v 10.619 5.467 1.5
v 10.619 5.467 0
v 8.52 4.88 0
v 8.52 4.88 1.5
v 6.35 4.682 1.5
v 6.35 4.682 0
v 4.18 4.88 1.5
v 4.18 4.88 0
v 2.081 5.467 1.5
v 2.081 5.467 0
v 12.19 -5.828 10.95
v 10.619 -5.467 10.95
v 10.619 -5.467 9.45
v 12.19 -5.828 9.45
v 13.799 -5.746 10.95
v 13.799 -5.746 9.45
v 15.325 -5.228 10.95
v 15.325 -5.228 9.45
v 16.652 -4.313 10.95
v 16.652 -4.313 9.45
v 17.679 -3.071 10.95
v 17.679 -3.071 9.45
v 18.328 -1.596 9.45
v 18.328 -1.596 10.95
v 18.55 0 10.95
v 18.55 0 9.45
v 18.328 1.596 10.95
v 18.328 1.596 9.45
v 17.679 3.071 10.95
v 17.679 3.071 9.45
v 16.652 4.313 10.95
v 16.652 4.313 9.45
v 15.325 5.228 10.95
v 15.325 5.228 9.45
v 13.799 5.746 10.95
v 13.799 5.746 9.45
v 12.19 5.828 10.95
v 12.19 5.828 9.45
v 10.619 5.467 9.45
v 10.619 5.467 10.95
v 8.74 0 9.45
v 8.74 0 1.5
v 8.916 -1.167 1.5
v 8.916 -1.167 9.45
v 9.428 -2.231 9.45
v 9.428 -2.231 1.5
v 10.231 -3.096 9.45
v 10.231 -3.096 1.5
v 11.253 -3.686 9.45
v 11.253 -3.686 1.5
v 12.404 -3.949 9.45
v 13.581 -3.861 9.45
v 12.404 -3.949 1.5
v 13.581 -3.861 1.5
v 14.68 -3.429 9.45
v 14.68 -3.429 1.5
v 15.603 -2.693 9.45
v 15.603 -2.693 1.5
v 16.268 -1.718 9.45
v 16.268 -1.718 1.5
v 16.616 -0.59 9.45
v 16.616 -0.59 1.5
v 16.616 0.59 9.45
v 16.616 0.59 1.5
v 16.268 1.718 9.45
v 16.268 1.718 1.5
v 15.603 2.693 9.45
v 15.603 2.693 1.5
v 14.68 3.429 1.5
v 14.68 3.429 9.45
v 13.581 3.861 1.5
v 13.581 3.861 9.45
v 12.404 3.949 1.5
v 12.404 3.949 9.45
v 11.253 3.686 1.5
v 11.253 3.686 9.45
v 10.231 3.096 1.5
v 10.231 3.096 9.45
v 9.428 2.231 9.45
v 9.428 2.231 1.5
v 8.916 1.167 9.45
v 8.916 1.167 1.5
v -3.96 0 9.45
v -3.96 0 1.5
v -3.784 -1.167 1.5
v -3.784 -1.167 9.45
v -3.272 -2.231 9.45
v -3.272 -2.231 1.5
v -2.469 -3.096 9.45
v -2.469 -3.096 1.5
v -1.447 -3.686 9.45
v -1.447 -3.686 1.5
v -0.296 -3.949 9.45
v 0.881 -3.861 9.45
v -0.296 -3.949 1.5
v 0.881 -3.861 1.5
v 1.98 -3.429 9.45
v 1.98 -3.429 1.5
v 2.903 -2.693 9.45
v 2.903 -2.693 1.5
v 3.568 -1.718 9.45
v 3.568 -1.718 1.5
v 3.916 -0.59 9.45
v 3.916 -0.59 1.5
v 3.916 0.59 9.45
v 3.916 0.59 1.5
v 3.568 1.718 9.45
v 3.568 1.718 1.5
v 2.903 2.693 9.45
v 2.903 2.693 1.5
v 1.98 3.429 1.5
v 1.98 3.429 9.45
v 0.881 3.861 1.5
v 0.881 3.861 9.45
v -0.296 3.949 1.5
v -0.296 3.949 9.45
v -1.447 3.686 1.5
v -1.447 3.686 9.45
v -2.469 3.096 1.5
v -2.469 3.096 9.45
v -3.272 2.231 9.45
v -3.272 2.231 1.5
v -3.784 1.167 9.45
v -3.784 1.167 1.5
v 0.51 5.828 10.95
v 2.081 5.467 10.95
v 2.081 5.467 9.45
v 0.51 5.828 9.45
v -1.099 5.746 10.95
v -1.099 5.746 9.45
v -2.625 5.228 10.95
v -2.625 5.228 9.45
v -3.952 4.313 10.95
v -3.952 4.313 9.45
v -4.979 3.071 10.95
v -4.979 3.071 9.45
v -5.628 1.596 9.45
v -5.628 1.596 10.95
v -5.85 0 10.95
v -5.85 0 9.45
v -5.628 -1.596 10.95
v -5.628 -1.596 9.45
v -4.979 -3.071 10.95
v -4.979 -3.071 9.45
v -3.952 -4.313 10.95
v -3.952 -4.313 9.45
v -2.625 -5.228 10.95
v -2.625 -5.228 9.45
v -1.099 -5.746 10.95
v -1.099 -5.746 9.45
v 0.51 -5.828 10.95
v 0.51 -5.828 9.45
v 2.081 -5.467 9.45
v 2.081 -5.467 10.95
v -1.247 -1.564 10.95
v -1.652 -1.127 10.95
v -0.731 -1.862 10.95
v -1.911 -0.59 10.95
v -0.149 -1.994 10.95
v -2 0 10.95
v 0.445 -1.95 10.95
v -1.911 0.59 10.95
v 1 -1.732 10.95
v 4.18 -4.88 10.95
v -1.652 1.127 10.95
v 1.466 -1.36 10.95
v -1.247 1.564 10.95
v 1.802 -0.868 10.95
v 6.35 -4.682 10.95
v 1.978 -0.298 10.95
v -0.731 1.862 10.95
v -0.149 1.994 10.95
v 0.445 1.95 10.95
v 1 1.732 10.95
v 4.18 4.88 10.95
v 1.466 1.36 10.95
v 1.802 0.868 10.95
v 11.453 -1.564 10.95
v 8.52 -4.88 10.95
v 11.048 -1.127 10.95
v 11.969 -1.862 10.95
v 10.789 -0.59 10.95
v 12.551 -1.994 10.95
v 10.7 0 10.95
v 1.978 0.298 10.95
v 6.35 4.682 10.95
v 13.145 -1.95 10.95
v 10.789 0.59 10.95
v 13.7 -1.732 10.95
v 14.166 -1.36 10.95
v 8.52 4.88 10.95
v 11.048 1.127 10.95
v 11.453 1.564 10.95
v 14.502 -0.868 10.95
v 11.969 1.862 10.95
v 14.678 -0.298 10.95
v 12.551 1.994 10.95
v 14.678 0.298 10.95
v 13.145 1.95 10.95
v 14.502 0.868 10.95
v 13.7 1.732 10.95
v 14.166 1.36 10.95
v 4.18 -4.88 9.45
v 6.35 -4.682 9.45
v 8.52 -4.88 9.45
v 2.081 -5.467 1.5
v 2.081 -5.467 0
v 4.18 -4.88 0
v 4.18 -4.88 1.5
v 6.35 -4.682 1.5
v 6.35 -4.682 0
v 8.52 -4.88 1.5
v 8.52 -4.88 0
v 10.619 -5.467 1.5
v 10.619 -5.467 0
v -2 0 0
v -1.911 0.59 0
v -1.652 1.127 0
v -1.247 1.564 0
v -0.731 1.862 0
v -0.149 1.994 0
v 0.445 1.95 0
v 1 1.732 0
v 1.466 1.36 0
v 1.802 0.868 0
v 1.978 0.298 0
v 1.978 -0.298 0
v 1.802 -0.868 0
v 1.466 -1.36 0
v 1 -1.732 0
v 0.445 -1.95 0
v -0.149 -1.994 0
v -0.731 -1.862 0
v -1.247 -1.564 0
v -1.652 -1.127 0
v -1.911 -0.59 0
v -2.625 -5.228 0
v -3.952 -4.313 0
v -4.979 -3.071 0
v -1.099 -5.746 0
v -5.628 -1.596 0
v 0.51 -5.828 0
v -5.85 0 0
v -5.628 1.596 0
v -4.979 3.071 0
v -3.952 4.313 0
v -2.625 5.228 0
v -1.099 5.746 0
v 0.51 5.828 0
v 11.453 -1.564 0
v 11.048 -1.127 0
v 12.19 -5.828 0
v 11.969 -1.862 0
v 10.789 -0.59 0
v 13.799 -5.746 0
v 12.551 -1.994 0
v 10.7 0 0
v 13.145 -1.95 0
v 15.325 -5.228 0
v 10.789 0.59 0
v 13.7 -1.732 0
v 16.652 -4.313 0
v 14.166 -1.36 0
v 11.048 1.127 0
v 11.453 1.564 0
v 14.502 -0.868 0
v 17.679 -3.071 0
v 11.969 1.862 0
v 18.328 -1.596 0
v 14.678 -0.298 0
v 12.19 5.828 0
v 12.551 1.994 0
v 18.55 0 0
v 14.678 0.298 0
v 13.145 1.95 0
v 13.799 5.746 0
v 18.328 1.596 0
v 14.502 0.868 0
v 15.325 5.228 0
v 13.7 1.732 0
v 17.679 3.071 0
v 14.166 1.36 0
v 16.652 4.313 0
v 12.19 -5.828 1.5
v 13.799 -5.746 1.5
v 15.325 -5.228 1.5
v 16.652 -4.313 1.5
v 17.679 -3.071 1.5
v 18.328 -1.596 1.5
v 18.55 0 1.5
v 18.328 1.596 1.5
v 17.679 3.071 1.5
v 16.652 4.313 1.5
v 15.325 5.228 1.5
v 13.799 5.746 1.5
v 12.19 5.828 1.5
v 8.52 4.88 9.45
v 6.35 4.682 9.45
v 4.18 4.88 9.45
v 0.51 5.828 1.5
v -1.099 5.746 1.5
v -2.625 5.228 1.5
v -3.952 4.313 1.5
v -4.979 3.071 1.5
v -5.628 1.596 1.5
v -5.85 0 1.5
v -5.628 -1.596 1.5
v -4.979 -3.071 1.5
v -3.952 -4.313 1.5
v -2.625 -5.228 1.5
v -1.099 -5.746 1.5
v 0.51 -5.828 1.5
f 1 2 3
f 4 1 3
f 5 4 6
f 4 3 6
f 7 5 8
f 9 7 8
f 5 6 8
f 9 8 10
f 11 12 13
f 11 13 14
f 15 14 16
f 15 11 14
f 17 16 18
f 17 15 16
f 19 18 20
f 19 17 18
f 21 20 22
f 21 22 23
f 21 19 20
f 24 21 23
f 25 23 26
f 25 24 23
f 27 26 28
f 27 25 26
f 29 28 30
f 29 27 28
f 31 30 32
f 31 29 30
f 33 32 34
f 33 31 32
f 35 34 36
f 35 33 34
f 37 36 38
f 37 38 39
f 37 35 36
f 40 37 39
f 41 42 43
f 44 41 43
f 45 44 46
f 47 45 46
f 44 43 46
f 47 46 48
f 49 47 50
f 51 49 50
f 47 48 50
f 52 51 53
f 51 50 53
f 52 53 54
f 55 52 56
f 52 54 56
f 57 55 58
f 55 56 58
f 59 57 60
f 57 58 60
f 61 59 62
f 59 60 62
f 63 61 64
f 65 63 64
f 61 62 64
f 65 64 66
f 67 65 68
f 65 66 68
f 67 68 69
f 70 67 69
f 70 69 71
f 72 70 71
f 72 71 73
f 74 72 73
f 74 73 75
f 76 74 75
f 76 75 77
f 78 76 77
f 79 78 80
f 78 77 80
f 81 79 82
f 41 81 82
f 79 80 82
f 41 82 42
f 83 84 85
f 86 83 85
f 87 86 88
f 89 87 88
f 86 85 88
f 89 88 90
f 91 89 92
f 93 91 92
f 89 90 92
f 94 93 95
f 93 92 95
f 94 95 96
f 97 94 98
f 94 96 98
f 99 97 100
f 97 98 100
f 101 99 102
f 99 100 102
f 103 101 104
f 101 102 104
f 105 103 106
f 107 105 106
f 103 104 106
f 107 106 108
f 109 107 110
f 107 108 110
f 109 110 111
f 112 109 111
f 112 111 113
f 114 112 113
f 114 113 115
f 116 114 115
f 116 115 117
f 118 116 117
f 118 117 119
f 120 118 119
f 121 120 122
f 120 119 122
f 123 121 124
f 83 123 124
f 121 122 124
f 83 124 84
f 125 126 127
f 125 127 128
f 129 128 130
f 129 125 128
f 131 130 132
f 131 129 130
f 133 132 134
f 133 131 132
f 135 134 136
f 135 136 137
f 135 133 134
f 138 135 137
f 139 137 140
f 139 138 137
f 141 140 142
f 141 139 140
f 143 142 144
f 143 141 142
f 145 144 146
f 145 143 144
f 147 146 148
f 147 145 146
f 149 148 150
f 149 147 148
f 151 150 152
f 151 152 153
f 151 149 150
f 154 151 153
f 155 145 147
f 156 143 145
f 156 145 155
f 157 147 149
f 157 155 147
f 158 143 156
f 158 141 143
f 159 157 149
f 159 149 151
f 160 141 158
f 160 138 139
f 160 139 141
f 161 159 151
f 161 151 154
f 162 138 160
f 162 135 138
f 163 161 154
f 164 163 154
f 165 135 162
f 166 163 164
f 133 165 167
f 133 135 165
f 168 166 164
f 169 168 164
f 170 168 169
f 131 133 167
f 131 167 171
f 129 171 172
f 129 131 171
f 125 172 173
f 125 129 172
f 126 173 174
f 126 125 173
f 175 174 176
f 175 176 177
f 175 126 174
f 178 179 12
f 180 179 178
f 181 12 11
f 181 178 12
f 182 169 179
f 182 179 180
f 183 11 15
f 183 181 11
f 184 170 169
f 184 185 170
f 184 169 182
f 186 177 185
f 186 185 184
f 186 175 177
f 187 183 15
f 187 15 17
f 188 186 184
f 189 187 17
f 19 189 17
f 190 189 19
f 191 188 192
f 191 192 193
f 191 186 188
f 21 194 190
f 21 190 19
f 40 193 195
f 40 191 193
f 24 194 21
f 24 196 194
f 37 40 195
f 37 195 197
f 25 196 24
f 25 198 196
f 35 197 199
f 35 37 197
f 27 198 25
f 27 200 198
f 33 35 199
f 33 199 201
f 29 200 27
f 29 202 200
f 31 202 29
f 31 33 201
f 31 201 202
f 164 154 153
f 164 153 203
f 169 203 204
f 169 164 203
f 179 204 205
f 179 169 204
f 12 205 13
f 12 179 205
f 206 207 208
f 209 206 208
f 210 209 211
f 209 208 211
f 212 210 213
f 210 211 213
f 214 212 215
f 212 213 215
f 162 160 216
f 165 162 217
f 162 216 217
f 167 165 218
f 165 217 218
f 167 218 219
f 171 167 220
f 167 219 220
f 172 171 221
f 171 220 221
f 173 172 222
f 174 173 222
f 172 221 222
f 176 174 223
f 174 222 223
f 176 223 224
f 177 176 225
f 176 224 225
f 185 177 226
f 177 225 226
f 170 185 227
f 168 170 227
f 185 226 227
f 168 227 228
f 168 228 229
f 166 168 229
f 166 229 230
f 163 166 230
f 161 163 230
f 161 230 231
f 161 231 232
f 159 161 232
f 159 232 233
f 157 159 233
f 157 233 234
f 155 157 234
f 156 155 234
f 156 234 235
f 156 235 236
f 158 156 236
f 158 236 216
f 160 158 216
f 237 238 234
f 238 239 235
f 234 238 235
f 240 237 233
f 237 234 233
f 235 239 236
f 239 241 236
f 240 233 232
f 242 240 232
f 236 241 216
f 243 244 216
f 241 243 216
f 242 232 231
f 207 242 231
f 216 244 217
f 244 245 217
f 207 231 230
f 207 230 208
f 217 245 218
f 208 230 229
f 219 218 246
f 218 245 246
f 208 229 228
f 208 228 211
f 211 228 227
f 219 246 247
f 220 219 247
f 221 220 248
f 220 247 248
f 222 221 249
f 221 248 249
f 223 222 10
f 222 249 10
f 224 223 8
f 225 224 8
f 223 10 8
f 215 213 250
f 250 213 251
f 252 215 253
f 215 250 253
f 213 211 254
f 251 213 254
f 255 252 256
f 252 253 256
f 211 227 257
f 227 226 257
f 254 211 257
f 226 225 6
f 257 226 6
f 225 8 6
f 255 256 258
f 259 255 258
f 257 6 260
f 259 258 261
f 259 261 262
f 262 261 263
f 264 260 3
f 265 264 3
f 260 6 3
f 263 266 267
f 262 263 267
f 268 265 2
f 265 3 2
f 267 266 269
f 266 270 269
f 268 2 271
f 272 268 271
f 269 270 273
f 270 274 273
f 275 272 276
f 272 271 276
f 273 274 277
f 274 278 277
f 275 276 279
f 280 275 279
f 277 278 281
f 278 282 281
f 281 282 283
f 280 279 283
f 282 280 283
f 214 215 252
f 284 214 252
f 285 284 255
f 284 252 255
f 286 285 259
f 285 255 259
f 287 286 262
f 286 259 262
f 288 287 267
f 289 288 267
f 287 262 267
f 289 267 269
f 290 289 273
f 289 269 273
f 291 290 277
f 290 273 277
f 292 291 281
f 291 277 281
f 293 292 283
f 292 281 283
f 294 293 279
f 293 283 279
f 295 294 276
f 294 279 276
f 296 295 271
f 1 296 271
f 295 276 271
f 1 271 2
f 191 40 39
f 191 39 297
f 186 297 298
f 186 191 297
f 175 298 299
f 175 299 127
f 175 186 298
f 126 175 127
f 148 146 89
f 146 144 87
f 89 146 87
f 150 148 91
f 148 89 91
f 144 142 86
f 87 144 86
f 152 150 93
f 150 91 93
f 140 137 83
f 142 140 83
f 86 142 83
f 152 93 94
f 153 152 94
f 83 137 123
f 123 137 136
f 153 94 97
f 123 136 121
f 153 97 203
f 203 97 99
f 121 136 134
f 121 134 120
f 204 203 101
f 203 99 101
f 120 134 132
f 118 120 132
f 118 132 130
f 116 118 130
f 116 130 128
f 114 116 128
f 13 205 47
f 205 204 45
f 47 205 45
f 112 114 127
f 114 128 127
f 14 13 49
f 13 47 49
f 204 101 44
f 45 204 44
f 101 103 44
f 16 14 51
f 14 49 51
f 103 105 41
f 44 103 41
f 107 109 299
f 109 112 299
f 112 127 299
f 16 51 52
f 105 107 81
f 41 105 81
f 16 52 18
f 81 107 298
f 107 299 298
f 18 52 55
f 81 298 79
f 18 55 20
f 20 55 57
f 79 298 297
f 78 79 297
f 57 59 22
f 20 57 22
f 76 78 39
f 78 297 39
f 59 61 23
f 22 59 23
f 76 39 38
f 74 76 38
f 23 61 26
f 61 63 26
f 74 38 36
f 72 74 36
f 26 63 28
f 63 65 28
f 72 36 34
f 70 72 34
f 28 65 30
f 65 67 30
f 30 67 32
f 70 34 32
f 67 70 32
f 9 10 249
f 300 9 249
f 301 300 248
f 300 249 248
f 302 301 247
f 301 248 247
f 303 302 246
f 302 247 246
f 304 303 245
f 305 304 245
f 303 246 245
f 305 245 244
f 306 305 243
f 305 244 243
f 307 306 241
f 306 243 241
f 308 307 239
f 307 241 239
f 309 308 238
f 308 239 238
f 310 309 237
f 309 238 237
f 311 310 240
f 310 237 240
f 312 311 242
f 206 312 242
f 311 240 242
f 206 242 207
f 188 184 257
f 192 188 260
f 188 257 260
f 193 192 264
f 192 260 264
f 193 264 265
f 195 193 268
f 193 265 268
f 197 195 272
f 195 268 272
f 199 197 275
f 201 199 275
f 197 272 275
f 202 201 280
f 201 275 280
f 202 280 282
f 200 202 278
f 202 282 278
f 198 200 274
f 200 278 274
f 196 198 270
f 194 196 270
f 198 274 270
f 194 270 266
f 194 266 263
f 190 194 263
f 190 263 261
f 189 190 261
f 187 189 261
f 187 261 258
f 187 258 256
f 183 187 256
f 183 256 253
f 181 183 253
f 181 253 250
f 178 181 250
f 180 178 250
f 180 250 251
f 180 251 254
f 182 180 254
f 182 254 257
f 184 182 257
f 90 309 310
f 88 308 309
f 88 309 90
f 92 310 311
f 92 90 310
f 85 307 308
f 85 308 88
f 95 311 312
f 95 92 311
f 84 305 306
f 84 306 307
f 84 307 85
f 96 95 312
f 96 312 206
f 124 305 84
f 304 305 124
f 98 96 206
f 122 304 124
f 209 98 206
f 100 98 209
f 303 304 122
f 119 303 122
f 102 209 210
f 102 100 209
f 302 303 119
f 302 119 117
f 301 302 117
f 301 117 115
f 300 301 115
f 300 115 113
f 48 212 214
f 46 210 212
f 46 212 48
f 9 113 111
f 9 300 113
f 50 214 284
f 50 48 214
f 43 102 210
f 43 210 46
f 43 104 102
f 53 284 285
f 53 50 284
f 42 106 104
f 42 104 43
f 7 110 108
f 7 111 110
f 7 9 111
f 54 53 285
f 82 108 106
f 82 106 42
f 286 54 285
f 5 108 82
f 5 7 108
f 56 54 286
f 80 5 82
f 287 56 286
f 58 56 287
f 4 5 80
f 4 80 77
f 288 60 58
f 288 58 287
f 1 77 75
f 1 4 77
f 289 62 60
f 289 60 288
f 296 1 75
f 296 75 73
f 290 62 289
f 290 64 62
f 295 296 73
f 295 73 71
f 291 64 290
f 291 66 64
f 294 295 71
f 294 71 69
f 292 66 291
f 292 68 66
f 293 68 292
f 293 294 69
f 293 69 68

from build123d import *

# Parameters (mm, degrees)
BOSS_EXTRUDE1_DEPTH = 1.5
SKETCH2_R           = 3.96
BOSS_EXTRUDE2_DEPTH = 7.95
SKETCH3_R           = 2
CUT_EXTRUDE1_DEPTH  = 23.321010282


with BuildPart() as part:
    # Sketch1 → Boss-Extrude1 (new body)
    with BuildSketch(Plane.XY):
        with BuildLine():
            ThreePointArc((2.081092437, 5.467316917), (-5.85, 0), (2.081092437, -5.467316917))
            ThreePointArc((2.081092437, -5.467316917), (6.35, -4.682325977), (10.618907563, -5.467316917))
            ThreePointArc((10.618907563, -5.467316917), (18.55, 0), (10.618907563, 5.467316917))
            ThreePointArc((10.618907563, 5.467316917), (6.35, 4.682325977), (2.081092437, 5.467316917))
        make_face()
    extrude(amount=BOSS_EXTRUDE1_DEPTH)


with BuildPart() as body_2:
    # Mirror2: mirrored copy
    add(part.part.mirror(Plane.XY.offset(5.475)))


with BuildPart() as part_1:
    add(part.part)

    add(body_2.part)  # Boss-Extrude2 merges body 2
    # Sketch2 → Boss-Extrude2 (add)
    with BuildSketch(Plane.XY.offset(1.5)):
        with Locations(Location((0, 0, 0), (0, 0, 180))):
            Circle(SKETCH2_R)
        with Locations(Location((12.7, 0, 0), (0, 0, 180))):
            Circle(SKETCH2_R)
    extrude(amount=BOSS_EXTRUDE2_DEPTH)

    # Sketch3 → Cut-Extrude1 (cut, through all)
    with BuildSketch(Plane(origin=(0, 0, 0), x_dir=(-1, 0, 0), z_dir=(0, 0, -1))):
        Circle(SKETCH3_R)
        with Locations((-12.7, 0)):
            Circle(SKETCH3_R)
    extrude(amount=-CUT_EXTRUDE1_DEPTH, mode=Mode.SUBTRACT)


solid = part_1.part
